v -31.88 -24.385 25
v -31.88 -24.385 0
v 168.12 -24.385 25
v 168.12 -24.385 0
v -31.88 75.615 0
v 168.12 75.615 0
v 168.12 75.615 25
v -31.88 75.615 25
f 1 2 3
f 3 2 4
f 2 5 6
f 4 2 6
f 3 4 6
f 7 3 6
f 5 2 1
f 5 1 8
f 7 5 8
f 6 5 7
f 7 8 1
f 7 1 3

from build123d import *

# Parameters (mm, degrees)
F0_W     = 200
F0_H     = 100
F1_DEPTH = 25
F2_DEPTH = 25
F3_DEPTH = 25


with BuildPart() as f1:
    # F0 (on Top) → F1 (new body)
    with BuildSketch(Plane.XY):
        with Locations((68.119971, 25.614946)):
            Rectangle(F0_W, F0_H)
    extrude(amount=F1_DEPTH)

    # F0 (on Top) → F2 (join)
    with BuildSketch(Plane.XY):
        with Locations((68.119971, 25.614946)):
            Rectangle(F0_W, F0_H)
    extrude(amount=F2_DEPTH)

    # F0 (on Top) → F3 (join)
    with BuildSketch(Plane.XY):
        with Locations((68.119971, 25.614946)):
            Rectangle(F0_W, F0_H)
    extrude(amount=F3_DEPTH)


solid = f1.part
